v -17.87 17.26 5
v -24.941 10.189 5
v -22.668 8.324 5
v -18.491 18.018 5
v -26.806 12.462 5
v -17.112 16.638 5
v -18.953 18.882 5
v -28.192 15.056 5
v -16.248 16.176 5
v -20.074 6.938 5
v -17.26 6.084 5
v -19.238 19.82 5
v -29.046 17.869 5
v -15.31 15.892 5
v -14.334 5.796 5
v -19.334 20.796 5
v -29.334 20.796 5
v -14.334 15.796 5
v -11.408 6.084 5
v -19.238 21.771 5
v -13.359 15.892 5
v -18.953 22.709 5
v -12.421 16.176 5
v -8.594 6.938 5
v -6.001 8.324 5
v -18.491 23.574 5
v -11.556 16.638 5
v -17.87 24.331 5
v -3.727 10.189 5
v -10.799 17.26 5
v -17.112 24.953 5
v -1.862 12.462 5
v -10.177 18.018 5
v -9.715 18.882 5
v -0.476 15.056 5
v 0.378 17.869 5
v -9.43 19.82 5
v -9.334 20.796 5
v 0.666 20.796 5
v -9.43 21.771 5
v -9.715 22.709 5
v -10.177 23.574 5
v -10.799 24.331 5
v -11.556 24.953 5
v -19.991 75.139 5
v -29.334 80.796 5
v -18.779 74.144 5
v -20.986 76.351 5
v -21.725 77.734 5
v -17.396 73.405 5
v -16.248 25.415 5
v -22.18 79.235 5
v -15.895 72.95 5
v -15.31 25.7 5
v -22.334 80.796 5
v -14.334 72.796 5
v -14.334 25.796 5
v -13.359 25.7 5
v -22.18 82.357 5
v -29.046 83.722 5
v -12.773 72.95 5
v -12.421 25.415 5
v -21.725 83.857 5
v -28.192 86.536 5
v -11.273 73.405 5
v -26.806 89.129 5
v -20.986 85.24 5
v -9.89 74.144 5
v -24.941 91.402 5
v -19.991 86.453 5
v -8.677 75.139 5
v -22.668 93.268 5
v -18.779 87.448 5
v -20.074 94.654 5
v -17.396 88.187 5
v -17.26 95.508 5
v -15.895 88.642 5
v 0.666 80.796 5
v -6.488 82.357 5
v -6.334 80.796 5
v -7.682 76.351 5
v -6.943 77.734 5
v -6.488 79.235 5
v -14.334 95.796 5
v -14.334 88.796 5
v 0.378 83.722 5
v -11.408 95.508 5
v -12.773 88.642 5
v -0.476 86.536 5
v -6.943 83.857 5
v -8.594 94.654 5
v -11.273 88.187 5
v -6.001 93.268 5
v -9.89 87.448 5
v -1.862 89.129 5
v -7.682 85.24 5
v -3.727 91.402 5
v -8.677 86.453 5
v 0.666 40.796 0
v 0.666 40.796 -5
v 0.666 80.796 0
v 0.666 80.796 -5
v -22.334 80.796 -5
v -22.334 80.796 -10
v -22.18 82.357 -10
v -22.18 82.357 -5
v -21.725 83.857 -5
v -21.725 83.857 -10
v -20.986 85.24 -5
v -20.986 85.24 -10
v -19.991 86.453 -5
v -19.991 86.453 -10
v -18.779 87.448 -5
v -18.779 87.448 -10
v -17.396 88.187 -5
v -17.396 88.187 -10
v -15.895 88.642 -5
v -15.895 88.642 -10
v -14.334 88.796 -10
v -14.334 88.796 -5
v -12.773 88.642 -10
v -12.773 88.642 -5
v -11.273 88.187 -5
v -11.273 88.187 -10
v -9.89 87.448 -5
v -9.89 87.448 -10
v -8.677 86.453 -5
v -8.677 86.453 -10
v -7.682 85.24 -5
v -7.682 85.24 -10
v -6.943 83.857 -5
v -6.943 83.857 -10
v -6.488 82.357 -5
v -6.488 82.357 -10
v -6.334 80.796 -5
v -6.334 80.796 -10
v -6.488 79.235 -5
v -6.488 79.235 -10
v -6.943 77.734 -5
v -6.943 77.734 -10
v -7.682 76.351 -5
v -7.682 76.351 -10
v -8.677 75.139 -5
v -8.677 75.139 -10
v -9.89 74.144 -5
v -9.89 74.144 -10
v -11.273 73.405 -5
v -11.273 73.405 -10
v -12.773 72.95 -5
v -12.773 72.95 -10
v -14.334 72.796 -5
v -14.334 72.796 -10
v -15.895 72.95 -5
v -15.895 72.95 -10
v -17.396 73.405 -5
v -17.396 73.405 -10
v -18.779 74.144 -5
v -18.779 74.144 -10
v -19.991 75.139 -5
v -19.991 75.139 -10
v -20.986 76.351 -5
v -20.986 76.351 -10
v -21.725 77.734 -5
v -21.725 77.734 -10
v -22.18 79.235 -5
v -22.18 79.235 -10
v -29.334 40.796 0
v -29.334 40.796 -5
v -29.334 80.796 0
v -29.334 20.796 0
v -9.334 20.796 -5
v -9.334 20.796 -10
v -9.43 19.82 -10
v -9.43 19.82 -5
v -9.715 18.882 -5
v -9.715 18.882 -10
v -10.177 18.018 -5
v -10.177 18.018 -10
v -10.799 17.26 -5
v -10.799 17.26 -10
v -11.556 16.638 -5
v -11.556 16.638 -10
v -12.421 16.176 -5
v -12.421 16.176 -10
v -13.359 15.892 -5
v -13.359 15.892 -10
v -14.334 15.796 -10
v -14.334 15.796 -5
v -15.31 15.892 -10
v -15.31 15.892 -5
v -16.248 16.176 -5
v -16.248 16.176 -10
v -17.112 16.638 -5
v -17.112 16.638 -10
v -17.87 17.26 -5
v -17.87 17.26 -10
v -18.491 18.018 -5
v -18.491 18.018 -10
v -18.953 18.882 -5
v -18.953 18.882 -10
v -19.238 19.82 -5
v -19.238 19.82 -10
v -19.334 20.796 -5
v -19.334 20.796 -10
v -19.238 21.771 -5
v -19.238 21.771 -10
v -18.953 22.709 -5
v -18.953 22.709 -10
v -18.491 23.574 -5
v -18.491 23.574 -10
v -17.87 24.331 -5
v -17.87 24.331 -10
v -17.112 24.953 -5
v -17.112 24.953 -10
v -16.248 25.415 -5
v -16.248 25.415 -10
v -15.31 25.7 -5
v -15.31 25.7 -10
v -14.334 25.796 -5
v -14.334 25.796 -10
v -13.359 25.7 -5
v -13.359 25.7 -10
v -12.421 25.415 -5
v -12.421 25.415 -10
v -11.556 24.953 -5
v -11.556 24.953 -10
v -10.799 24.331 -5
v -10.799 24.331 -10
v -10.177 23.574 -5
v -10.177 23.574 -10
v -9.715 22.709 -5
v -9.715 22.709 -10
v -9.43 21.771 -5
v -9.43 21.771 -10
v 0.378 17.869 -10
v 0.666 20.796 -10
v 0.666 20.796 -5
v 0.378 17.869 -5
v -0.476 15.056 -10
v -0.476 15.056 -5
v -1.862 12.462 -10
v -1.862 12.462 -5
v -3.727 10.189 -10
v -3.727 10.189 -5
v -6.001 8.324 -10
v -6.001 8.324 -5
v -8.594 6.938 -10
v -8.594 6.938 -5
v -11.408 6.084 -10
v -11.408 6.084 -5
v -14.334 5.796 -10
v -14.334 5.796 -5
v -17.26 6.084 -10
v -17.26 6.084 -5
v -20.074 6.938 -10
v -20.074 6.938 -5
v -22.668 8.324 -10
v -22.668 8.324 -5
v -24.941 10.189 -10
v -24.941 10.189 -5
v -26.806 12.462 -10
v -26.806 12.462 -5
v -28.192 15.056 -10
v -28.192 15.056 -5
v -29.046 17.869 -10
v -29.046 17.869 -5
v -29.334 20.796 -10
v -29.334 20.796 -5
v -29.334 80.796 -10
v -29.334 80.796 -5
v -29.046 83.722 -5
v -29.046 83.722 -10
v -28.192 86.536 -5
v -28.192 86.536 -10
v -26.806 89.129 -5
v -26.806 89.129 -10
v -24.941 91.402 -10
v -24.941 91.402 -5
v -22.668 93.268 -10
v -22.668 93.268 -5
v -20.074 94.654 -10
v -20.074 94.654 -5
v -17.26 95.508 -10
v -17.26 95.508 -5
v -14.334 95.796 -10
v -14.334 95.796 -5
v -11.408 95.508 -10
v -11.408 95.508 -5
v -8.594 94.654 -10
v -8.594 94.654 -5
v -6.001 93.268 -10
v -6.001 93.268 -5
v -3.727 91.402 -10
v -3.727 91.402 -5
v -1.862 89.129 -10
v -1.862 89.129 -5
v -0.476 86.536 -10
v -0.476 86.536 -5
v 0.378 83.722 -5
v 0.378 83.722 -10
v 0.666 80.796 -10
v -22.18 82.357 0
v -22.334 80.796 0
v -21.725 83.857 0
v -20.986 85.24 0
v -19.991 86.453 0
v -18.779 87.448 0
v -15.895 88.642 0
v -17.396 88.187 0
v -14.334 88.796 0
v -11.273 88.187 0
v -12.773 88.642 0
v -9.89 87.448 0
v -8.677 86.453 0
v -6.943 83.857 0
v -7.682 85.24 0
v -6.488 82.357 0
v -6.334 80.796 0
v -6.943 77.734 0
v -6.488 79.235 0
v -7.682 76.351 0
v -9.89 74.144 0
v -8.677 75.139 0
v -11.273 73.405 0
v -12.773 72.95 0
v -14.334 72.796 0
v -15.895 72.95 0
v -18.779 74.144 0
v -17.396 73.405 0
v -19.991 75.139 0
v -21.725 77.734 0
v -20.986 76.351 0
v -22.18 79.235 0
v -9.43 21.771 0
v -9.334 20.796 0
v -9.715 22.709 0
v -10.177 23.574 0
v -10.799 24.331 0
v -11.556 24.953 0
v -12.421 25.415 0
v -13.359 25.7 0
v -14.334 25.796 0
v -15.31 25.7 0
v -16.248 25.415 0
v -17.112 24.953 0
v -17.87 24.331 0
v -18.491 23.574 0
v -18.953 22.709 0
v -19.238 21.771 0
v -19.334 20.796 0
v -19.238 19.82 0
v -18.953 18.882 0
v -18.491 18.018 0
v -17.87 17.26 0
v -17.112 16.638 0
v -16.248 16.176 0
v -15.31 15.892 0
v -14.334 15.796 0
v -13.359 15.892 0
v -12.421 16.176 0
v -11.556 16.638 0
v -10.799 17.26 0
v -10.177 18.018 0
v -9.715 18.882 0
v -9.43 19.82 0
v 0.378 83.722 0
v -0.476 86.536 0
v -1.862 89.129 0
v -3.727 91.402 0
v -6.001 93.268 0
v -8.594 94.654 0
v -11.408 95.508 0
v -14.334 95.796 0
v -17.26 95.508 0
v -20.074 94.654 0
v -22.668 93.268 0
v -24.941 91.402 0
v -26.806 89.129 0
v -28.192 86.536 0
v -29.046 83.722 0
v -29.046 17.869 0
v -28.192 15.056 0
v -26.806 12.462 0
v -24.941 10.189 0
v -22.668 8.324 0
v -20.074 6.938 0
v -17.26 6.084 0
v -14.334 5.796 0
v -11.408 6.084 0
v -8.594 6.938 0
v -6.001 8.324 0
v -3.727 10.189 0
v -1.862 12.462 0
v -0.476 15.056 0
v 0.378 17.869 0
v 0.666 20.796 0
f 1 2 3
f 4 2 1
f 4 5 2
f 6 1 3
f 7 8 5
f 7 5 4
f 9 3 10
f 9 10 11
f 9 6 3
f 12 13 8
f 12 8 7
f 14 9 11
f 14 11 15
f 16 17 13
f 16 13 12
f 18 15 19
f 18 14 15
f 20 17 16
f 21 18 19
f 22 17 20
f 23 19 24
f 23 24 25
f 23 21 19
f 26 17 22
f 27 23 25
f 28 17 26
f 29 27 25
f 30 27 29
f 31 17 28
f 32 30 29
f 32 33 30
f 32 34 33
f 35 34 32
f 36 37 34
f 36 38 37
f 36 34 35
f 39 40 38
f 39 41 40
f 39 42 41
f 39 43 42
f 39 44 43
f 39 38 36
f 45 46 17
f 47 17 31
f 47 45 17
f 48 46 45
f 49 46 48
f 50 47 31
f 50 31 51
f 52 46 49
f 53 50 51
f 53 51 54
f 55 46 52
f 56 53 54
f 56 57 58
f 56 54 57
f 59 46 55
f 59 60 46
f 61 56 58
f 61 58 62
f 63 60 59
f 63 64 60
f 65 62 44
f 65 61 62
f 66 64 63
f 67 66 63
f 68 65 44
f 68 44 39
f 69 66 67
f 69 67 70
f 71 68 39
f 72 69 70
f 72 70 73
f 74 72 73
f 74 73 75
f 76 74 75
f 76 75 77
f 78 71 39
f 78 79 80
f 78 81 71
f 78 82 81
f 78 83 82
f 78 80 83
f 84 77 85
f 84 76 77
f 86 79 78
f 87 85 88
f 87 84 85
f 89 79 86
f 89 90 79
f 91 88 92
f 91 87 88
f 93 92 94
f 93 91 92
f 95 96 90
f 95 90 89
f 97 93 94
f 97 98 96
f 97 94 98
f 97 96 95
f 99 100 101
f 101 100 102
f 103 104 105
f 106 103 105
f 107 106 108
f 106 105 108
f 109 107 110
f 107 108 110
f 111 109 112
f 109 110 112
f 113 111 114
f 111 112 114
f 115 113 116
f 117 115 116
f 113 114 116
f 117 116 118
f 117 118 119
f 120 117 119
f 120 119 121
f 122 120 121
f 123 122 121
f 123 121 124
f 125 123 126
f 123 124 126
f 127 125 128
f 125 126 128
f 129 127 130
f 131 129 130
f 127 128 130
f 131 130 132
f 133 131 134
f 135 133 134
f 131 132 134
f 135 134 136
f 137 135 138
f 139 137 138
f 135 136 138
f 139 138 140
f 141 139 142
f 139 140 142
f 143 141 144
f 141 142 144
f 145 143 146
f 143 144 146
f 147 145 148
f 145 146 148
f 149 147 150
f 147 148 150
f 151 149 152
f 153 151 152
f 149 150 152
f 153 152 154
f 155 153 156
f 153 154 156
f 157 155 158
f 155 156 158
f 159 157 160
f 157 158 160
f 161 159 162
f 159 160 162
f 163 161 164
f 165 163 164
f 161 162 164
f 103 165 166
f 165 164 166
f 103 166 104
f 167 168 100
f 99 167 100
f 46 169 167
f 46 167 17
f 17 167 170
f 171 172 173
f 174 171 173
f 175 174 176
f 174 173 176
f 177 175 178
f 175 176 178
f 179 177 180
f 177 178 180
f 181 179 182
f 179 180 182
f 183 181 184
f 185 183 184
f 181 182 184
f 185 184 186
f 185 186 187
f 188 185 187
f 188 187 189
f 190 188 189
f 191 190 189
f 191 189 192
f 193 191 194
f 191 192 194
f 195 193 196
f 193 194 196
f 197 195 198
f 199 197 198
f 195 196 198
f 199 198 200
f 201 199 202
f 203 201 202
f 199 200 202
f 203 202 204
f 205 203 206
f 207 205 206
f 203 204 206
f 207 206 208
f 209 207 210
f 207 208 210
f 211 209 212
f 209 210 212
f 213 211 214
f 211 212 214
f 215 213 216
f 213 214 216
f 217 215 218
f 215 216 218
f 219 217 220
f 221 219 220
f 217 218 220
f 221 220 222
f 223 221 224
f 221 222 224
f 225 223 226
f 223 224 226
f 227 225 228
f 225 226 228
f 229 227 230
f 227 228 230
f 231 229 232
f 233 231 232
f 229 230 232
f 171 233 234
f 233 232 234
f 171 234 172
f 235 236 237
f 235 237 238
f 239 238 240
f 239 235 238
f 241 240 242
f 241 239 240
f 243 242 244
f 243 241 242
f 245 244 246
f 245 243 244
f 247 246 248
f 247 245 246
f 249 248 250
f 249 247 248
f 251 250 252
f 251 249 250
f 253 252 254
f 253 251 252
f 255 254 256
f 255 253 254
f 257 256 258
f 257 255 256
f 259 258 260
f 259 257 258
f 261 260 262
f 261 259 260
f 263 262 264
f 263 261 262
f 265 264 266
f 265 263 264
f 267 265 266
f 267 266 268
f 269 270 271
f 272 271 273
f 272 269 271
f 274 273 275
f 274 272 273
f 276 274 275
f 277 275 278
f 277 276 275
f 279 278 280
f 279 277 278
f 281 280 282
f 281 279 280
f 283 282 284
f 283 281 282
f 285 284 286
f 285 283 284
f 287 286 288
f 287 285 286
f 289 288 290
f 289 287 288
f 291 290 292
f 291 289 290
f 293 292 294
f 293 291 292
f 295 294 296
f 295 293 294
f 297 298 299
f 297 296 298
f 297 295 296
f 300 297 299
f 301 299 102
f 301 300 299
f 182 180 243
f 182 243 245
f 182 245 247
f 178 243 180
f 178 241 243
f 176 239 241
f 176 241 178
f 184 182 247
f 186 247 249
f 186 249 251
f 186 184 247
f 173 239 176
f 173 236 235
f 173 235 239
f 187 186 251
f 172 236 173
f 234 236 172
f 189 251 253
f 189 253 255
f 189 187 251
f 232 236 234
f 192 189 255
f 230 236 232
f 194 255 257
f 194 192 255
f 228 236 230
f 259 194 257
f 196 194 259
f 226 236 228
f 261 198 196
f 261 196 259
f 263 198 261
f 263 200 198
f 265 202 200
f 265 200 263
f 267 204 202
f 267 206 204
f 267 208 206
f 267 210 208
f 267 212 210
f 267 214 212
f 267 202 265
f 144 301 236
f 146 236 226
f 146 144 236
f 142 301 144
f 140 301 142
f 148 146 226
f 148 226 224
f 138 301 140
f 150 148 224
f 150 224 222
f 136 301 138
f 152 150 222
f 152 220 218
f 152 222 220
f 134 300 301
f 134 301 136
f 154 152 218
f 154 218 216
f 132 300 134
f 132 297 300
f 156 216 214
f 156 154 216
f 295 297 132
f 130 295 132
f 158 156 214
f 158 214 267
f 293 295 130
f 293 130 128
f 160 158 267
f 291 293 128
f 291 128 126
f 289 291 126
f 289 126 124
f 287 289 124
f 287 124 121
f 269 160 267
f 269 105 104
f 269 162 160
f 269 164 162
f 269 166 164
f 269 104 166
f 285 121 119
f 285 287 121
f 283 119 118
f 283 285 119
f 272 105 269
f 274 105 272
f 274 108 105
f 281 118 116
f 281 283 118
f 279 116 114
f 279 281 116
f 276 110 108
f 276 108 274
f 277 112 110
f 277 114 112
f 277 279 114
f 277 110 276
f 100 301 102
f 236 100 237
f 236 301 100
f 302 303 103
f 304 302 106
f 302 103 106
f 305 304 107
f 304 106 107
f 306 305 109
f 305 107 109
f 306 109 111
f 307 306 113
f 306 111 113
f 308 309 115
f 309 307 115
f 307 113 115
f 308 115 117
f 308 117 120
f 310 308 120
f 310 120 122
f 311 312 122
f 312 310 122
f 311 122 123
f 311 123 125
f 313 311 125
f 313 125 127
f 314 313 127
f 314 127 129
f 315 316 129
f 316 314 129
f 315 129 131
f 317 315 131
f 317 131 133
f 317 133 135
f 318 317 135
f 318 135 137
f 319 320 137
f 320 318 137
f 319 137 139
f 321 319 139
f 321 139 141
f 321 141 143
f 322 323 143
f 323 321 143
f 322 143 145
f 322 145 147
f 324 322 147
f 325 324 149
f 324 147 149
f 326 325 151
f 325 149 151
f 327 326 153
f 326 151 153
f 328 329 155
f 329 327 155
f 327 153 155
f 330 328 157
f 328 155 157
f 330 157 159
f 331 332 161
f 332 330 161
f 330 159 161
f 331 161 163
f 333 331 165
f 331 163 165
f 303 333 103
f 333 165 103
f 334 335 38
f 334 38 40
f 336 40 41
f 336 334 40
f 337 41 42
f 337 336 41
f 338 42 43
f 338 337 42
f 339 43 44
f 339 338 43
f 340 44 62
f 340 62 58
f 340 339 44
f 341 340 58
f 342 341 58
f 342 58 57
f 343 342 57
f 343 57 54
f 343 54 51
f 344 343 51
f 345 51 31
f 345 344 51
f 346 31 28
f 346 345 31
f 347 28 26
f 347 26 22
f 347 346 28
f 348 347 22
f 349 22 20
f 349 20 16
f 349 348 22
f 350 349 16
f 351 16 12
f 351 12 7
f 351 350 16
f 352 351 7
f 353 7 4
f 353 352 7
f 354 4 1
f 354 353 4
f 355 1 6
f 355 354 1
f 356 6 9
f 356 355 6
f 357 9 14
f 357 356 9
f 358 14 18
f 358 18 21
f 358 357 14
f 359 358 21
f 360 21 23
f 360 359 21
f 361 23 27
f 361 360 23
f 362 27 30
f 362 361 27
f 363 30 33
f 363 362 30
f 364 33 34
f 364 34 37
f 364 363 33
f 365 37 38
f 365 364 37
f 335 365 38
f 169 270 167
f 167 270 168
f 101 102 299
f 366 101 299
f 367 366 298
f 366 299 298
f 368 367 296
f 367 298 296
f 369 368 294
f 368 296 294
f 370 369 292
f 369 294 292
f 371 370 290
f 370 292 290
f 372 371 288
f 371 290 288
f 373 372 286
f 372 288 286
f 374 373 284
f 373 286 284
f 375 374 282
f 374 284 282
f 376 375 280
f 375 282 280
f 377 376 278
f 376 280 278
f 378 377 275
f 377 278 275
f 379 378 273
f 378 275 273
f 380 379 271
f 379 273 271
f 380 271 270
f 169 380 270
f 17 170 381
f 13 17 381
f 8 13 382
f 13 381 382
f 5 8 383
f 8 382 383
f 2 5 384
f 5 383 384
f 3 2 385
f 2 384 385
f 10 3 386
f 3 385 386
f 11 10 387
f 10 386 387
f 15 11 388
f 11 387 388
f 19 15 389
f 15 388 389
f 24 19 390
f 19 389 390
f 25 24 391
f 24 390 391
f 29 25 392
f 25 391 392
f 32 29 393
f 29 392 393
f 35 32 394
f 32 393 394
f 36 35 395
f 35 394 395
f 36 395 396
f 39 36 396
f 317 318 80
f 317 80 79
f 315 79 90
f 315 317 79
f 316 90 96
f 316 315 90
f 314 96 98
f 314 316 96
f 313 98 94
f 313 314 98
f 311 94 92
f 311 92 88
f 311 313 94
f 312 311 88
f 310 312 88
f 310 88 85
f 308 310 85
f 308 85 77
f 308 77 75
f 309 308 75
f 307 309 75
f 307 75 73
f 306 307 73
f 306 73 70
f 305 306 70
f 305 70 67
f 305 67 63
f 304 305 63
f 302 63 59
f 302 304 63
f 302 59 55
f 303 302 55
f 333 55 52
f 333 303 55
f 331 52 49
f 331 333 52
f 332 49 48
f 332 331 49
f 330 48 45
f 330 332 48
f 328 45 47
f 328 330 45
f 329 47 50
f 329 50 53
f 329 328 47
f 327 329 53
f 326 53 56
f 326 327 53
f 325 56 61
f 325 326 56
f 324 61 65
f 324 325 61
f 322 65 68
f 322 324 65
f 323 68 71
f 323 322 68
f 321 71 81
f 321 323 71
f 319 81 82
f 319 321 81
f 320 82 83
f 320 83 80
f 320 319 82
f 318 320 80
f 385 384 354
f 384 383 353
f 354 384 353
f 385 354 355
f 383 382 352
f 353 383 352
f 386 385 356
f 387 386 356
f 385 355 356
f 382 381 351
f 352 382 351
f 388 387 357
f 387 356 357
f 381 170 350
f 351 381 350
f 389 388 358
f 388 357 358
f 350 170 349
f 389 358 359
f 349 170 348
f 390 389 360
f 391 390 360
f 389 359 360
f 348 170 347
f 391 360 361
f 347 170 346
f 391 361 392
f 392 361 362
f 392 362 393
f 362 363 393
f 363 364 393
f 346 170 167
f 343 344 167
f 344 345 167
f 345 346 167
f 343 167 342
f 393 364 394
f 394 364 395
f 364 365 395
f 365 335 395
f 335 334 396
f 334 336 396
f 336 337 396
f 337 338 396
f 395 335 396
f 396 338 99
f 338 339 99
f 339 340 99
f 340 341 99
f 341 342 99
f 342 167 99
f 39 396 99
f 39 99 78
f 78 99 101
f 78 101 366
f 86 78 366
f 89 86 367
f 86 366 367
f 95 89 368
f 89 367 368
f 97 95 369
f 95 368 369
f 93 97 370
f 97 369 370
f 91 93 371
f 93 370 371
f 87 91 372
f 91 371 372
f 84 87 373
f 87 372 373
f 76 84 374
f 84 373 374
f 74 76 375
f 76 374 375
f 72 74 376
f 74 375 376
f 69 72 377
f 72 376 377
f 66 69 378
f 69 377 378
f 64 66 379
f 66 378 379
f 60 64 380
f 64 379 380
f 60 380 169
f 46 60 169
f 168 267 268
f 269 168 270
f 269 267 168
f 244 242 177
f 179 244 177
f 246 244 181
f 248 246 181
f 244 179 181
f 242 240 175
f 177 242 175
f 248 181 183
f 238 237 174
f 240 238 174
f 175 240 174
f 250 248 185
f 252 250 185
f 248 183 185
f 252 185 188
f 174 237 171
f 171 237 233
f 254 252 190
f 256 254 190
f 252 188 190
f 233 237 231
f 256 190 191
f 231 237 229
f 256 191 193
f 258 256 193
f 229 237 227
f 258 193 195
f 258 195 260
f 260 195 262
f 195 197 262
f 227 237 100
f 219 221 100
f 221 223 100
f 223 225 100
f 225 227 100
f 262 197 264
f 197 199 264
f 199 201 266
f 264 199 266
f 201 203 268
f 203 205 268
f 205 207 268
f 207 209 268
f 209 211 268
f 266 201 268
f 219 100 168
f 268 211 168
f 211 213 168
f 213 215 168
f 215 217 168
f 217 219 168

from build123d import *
from build123d.topology import SkipClean

# Parameters (mm, degrees)
SKETCH3_R           = 5
SKETCH3_R_2         = 8
BOSS_EXTRUDE1_DEPTH = 5
BOSS_EXTRUDE4_START = 5
SKETCH4_R           = 8
BOSS_EXTRUDE4_DEPTH = 5
BOSS_EXTRUDE5_START = 5
SKETCH5_R           = 8
SKETCH5_R_2         = 5
BOSS_EXTRUDE5_DEPTH = 5


with BuildPart() as part:
    # Sketch3 → Boss-Extrude1 (new body)
    with BuildSketch(Plane.XY):
        with BuildLine():
            Line((-29.334087167, 80.795829607), (-29.334087167, 20.795829607))
            ThreePointArc((-29.334087167, 20.795829607), (-14.334087167, 5.795829607), (0.665912833, 20.795829607))
            Line((0.665912833, 20.795829607), (0.665912833, 80.795829607))
            ThreePointArc((0.665912833, 80.795829607), (-14.334087167, 95.795829607), (-29.334087167, 80.795829607))
        make_face()
        with Locations((-14.334087167, 20.795829607)):
            Circle(SKETCH3_R, mode=Mode.SUBTRACT)
        with Locations((-14.334087167, 80.795829607)):
            Circle(SKETCH3_R_2, mode=Mode.SUBTRACT)
    extrude(amount=BOSS_EXTRUDE1_DEPTH)

    # Sketch4 → Boss-Extrude4 (add)
    with SkipClean():  # the faces are left unmerged after this step: merging them gives an invalid solid
        with BuildSketch(Plane(origin=(0, 0, 0), x_dir=(-1, 0, 0), z_dir=(0, 0, -1)).offset(BOSS_EXTRUDE4_START)):
            with BuildLine():
                Line((29.334087167, 80.795829607), (29.334087167, 40.795829607))
                Line((29.334087167, 40.795829607), (-0.665912833, 40.795829607))
                Line((-0.665912833, 40.795829607), (-0.665912833, 80.795829607))
                ThreePointArc((-0.665912833, 80.795829607), (14.334087167, 95.795829607), (29.334087167, 80.795829607))
            make_face()
            with Locations((14.334087167, 80.795829607)):
                Circle(SKETCH4_R, mode=Mode.SUBTRACT)
        extrude(amount=-BOSS_EXTRUDE4_DEPTH)

    # Sketch5 → Boss-Extrude5 (add)
    with SkipClean():  # the faces are left unmerged after this step: merging them gives an invalid solid
        with BuildSketch(Plane(origin=(0, 0, -5), x_dir=(-1, 0, 0), z_dir=(0, 0, -1)).offset(BOSS_EXTRUDE5_START)):
            with BuildLine():
                Line((29.334087167, 20.795829607), (29.334087167, 80.795829607))
                ThreePointArc((29.334087167, 80.795829607), (14.334087167, 95.795829607), (-0.665912833, 80.795829607))
                Line((-0.665912833, 80.795829607), (-0.665912833, 20.795829607))
                ThreePointArc((-0.665912833, 20.795829607), (14.334087167, 5.795829607), (29.334087167, 20.795829607))
            make_face()
            with Locations((14.334087167, 80.795829607)):
                Circle(SKETCH5_R, mode=Mode.SUBTRACT)
            with Locations(Location((14.334087167, 20.795829607, 0), (0, 0, 180))):
                Circle(SKETCH5_R_2, mode=Mode.SUBTRACT)
        extrude(amount=-BOSS_EXTRUDE5_DEPTH)


solid = part.part
